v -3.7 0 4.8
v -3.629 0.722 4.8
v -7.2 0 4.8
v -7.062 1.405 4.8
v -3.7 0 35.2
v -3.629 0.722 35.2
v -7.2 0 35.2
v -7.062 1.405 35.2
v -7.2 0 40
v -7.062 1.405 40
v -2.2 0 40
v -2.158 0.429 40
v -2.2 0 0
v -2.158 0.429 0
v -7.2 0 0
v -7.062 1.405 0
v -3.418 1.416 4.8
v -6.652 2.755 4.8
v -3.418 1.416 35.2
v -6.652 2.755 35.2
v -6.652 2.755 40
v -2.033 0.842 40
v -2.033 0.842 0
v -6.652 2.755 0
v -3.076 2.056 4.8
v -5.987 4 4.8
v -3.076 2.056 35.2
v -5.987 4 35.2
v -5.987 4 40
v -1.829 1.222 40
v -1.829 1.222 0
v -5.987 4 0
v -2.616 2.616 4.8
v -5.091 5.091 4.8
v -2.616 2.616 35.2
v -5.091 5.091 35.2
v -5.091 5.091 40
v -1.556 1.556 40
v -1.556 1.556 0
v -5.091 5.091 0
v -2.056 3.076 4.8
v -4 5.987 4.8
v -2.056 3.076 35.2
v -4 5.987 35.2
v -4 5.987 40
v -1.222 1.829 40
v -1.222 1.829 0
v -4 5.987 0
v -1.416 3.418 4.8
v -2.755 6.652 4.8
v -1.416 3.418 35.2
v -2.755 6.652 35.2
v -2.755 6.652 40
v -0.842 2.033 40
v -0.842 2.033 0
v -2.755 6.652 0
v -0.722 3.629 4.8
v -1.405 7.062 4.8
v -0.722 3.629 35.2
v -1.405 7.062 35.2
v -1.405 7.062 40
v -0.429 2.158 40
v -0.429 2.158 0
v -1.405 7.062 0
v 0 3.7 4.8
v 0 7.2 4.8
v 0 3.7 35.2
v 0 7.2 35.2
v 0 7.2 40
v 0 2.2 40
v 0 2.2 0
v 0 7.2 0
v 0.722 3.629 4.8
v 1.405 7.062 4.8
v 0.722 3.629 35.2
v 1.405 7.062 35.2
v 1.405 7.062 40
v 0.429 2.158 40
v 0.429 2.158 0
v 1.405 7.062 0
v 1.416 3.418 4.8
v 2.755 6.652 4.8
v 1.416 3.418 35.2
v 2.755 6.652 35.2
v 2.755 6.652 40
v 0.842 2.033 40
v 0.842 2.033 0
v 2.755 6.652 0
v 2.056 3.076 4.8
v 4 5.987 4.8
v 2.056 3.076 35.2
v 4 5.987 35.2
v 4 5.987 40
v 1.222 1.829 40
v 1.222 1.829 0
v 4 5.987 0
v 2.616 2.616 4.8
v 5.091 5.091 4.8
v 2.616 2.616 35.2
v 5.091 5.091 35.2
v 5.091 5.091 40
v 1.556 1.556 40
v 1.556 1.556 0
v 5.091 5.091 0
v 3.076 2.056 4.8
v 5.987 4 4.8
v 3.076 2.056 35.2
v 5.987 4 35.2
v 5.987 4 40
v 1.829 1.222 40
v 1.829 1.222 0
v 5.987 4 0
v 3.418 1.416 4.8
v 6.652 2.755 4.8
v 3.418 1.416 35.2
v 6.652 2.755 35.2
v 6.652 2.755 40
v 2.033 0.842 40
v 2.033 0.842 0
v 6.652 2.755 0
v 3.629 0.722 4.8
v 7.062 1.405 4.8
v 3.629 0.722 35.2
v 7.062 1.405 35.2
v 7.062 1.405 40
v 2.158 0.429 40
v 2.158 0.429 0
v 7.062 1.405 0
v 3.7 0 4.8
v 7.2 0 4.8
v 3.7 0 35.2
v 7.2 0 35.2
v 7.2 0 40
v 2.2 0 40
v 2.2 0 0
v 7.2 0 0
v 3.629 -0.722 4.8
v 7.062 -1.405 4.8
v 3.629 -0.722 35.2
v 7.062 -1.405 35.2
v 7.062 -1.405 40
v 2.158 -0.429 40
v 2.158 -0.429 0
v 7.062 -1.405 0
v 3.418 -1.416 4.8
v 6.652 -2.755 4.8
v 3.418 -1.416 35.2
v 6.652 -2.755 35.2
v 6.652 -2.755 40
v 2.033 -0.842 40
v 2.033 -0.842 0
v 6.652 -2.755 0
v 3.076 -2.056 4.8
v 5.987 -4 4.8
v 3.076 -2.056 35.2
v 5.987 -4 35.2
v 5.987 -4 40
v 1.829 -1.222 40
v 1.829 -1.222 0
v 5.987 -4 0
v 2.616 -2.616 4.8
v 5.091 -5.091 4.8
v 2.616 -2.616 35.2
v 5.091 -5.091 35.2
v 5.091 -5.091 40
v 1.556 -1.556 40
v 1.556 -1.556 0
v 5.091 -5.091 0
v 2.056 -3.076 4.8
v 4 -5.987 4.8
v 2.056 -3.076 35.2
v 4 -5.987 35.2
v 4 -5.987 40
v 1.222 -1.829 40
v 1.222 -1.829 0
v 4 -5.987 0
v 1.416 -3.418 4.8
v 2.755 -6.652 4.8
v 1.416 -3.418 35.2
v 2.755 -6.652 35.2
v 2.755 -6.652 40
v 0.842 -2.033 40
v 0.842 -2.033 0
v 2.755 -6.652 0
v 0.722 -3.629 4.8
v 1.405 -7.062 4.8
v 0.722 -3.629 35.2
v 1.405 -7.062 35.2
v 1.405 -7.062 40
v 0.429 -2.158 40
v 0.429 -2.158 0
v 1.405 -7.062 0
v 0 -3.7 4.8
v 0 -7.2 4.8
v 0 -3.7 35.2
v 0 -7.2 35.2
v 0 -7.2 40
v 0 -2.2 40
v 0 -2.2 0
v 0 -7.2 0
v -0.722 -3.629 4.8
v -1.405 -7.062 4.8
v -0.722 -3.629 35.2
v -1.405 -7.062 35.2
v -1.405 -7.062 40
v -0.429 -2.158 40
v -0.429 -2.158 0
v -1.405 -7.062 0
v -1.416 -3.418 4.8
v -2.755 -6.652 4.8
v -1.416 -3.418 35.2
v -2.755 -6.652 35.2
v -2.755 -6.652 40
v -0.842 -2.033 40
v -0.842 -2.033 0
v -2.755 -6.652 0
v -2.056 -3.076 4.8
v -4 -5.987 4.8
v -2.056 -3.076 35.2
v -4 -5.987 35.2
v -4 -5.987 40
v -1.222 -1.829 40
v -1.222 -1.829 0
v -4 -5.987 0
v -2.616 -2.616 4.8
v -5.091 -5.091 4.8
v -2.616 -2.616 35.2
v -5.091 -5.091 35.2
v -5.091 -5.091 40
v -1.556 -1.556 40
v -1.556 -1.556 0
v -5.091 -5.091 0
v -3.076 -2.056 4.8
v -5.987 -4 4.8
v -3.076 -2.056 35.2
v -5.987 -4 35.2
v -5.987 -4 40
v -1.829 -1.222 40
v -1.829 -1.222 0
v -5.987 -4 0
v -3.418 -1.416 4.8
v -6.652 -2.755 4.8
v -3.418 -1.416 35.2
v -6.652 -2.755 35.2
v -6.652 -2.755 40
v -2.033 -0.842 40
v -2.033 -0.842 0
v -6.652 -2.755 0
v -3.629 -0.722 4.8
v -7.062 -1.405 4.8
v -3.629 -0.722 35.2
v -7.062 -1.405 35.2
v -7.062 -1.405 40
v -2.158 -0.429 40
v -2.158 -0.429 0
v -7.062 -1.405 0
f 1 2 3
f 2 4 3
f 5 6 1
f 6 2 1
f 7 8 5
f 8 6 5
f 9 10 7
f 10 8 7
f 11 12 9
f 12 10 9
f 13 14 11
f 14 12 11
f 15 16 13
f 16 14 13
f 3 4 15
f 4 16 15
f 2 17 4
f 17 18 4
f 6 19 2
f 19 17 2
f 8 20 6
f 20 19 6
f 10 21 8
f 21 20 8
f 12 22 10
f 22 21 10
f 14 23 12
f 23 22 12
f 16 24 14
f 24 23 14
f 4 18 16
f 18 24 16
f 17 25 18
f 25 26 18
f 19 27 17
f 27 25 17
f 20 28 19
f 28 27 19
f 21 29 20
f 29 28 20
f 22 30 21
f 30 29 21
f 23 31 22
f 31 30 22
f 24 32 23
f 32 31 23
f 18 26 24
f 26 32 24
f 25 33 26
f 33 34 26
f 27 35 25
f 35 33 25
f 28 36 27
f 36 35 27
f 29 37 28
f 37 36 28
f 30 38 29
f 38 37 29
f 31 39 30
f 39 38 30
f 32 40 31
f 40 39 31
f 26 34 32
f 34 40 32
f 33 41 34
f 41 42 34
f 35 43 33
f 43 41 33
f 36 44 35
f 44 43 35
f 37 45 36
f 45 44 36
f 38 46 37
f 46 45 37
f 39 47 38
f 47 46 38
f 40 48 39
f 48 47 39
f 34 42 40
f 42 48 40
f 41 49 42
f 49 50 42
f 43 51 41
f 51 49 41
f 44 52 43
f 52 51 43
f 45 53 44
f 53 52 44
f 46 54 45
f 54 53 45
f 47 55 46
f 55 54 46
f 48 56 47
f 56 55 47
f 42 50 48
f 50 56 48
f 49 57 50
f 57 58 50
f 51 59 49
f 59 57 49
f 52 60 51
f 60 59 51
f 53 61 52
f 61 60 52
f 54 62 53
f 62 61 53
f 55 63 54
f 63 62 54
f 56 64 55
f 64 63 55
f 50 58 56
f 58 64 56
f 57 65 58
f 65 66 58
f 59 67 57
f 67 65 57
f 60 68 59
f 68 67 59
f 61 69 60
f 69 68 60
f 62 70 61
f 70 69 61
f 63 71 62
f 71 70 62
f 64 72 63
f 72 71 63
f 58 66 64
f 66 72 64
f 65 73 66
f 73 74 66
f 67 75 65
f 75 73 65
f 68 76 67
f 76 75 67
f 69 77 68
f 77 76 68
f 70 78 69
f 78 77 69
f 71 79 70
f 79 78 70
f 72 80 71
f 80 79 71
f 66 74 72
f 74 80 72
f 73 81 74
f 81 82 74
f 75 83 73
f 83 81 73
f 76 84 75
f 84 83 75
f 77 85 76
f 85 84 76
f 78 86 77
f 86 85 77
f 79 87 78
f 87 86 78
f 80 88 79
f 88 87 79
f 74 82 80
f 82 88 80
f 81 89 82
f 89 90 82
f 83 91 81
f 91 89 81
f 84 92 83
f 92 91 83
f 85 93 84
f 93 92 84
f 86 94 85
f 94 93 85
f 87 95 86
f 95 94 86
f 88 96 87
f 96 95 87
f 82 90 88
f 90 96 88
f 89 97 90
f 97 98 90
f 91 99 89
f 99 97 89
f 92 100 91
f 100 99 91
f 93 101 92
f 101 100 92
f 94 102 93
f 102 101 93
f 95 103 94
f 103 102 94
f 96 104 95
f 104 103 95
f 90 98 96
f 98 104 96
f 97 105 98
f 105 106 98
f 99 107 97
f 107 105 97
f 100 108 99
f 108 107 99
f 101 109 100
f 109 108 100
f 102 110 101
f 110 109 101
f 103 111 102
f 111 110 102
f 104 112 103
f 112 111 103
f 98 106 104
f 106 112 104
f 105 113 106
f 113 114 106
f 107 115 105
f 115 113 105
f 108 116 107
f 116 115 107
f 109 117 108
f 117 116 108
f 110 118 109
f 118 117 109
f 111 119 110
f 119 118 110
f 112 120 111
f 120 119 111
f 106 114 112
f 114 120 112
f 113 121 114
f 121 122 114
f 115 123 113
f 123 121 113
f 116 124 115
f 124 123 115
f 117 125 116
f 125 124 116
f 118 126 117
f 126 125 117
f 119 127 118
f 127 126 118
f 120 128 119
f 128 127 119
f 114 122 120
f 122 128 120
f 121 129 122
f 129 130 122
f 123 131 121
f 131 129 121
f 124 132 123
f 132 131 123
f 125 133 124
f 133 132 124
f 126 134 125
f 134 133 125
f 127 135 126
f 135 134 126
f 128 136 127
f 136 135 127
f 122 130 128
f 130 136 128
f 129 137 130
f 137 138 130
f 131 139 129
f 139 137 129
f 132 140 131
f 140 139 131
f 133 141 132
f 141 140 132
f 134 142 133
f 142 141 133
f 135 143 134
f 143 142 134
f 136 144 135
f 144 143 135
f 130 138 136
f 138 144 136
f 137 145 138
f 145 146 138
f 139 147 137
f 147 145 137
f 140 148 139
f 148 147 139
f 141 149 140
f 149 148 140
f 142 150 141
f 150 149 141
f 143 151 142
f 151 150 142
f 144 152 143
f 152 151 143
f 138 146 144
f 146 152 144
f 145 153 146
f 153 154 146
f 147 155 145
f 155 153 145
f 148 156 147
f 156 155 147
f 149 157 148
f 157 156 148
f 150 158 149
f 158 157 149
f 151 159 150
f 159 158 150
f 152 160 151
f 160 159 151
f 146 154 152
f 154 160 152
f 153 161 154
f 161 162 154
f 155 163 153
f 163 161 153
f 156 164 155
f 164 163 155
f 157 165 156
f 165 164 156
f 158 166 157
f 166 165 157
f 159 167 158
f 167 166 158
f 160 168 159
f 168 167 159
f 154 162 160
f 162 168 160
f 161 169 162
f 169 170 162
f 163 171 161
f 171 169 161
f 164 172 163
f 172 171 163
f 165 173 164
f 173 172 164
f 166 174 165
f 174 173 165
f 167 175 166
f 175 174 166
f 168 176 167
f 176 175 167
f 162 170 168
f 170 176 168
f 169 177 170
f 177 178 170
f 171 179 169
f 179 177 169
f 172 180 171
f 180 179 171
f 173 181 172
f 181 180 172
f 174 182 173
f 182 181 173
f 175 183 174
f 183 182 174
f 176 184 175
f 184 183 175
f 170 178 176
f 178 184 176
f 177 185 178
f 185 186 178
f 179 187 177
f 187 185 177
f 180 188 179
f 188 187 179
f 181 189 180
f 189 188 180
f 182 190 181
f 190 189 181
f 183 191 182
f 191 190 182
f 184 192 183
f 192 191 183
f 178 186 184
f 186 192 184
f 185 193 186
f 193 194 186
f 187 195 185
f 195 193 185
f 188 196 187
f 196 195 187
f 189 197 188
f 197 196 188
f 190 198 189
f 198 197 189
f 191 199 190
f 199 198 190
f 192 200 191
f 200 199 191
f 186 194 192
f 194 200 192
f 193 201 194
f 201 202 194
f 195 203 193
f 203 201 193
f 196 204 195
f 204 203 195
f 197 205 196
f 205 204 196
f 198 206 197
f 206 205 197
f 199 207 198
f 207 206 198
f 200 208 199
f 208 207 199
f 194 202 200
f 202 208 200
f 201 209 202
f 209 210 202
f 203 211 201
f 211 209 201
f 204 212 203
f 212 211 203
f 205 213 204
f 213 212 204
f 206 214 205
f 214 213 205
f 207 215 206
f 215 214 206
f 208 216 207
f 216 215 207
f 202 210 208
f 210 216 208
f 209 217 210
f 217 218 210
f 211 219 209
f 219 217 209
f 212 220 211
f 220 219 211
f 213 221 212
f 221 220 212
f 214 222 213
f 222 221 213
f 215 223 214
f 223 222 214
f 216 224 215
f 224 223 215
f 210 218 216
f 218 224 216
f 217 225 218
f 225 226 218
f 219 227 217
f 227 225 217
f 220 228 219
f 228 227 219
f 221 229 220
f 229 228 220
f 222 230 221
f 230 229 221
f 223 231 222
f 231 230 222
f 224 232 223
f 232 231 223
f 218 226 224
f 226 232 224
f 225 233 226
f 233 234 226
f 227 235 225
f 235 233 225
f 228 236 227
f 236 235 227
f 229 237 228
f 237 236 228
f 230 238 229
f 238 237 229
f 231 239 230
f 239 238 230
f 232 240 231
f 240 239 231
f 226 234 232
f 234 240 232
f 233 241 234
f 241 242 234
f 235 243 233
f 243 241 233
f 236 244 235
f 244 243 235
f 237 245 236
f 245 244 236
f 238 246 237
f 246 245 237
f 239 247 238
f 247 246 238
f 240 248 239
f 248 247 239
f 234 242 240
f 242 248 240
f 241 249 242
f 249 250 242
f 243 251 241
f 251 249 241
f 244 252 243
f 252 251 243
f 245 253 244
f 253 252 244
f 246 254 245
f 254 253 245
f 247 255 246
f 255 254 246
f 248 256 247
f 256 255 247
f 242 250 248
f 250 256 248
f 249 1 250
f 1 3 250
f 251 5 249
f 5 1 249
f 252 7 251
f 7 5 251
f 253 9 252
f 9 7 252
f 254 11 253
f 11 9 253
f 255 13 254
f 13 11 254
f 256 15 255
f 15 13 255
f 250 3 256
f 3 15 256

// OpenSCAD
$fn = 32;

// ----------------------------------------------------------------------
// Profiled standoff: spool spacer, 40 mm long, bore 4.4 mm
// ----------------------------------------------------------------------

// --- parameters (mm) ---
revolve_angle = 360;      // full turn around the Z axis
profile_points = 8;       // points of the closed outline

profile = [[2.2, 0], [7.2, 0], [7.2, 4.8], [3.7, 4.8], [3.7, 35.2], [7.2, 35.2], [7.2, 40], [2.2, 40]];  // single closed polygon, 8 points, counter clockwise

// --- the one profile operation ---
rotate_extrude(angle = revolve_angle) polygon(points = profile);
